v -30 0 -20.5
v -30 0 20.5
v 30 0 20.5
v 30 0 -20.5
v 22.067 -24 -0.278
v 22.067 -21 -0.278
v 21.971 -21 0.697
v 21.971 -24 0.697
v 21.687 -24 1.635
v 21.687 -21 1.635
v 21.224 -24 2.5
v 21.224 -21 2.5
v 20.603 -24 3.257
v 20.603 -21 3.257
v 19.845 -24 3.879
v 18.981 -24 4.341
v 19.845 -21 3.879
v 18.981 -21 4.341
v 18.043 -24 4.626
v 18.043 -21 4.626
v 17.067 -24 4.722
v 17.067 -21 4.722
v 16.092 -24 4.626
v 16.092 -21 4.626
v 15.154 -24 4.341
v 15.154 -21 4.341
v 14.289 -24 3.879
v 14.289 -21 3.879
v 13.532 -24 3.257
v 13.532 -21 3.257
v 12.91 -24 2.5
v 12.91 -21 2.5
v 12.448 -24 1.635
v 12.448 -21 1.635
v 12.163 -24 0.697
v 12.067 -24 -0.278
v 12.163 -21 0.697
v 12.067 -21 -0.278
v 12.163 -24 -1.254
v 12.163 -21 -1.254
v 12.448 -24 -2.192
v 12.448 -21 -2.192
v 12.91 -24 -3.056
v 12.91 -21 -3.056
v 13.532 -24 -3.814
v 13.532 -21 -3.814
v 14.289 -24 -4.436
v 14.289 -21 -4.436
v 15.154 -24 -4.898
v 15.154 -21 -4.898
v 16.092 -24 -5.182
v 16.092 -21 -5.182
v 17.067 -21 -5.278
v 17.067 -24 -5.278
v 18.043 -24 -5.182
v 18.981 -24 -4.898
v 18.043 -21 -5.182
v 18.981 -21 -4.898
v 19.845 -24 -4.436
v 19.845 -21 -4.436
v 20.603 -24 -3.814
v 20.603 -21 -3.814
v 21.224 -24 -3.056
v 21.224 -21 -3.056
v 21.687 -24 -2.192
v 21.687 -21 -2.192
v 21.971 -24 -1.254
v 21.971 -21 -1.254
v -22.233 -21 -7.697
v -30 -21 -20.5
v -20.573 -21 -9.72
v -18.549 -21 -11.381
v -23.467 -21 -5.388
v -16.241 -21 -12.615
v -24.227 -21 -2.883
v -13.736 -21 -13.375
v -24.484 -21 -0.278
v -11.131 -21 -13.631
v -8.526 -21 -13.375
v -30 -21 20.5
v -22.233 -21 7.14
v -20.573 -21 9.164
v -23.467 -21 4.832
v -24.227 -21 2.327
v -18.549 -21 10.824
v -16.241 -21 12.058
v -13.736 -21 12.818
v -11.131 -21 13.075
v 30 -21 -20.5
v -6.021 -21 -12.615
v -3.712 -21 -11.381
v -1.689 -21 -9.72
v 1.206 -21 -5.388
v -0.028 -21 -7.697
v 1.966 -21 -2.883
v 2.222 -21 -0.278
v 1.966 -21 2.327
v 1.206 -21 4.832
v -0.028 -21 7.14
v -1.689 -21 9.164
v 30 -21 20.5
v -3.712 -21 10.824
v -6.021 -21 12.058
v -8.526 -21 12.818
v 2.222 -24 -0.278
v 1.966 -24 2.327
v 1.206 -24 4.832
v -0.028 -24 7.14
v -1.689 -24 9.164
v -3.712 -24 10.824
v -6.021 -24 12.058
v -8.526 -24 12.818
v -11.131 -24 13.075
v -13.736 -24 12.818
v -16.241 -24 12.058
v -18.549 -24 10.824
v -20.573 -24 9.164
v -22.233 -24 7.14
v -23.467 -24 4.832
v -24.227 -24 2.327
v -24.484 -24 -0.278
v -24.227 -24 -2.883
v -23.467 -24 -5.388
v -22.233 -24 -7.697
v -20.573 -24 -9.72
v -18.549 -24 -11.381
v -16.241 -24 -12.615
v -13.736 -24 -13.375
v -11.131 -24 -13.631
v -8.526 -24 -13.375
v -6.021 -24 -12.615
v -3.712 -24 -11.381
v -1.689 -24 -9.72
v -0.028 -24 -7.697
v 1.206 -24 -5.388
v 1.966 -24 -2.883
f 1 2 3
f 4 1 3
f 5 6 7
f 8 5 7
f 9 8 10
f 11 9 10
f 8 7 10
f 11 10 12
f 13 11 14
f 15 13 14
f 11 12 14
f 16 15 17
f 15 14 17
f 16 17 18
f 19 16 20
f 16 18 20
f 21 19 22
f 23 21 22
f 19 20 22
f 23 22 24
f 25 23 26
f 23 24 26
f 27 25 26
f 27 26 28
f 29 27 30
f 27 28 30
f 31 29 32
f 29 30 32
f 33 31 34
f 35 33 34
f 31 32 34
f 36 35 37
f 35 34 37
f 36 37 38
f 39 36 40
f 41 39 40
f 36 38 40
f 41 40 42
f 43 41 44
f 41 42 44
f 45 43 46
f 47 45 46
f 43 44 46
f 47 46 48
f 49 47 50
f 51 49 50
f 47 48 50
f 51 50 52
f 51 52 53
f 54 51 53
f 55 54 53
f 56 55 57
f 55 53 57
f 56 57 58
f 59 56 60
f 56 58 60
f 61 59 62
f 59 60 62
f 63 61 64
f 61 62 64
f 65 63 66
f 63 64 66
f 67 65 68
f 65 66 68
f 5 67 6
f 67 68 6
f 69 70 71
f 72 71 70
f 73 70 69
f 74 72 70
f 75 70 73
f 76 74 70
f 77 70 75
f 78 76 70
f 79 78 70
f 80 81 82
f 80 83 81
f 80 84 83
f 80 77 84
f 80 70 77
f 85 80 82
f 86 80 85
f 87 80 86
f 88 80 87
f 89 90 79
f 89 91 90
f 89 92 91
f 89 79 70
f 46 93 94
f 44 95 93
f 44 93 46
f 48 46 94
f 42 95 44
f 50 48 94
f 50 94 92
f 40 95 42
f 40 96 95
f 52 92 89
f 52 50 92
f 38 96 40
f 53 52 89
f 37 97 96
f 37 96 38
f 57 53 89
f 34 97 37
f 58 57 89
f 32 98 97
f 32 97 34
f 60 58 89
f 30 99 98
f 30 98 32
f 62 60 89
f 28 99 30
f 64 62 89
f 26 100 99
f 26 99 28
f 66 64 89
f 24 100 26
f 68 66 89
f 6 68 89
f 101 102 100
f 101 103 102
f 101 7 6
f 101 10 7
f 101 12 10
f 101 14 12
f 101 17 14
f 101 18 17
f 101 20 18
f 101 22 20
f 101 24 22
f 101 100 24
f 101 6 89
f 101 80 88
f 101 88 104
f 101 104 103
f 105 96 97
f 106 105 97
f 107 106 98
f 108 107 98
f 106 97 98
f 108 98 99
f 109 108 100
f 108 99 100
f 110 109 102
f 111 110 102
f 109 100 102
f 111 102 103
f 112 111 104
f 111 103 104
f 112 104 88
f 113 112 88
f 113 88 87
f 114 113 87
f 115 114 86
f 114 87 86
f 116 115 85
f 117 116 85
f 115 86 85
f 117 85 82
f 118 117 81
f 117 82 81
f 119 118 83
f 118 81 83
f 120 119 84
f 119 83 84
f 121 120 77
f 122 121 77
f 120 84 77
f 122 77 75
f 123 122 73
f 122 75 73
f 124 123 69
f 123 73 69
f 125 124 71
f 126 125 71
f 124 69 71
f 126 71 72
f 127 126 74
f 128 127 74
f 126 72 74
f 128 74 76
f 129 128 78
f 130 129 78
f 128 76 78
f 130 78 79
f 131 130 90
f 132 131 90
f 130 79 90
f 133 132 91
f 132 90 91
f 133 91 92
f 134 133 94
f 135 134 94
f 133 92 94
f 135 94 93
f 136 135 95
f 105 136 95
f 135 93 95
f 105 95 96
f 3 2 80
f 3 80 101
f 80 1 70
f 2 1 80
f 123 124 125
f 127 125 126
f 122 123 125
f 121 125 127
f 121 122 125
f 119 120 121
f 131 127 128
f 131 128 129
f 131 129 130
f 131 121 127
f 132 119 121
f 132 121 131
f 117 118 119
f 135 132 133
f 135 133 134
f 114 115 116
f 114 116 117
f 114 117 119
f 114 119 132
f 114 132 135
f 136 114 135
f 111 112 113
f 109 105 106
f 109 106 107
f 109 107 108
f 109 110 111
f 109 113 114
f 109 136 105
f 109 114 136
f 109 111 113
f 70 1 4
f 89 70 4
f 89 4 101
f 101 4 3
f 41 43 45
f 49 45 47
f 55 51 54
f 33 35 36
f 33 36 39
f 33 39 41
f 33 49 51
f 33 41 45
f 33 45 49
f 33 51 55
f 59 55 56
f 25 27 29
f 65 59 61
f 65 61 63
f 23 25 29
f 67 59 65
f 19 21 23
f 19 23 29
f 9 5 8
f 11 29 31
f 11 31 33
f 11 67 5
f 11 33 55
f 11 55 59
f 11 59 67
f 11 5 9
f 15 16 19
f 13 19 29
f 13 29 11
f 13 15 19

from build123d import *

# Parameters (mm, degrees)
F0_W     = 60
F0_H     = 41
F1_DEPTH = 21
F2_R     = 13.3531025353
F2_R_2   = 5
F3_DEPTH = 3


# Not quite as in the source:
# - a feature names something its author has since deleted; it is built from what else it names


with BuildPart() as f1:
    # F0 (on Front) → F1 (new body)
    with BuildSketch(Plane.XZ):
        Rectangle(F0_W, F0_H)
    extrude(amount=F1_DEPTH)

    # F2 (on face) → F3 (join)
    with BuildSketch(Plane.XZ.offset(21)):
        with Locations((-11.1307431944, -0.2782683878)):
            Circle(F2_R)
        with Locations((17.0671385713, -0.2782683878)):
            Circle(F2_R_2)
    extrude(amount=F3_DEPTH)


solid = f1.part
